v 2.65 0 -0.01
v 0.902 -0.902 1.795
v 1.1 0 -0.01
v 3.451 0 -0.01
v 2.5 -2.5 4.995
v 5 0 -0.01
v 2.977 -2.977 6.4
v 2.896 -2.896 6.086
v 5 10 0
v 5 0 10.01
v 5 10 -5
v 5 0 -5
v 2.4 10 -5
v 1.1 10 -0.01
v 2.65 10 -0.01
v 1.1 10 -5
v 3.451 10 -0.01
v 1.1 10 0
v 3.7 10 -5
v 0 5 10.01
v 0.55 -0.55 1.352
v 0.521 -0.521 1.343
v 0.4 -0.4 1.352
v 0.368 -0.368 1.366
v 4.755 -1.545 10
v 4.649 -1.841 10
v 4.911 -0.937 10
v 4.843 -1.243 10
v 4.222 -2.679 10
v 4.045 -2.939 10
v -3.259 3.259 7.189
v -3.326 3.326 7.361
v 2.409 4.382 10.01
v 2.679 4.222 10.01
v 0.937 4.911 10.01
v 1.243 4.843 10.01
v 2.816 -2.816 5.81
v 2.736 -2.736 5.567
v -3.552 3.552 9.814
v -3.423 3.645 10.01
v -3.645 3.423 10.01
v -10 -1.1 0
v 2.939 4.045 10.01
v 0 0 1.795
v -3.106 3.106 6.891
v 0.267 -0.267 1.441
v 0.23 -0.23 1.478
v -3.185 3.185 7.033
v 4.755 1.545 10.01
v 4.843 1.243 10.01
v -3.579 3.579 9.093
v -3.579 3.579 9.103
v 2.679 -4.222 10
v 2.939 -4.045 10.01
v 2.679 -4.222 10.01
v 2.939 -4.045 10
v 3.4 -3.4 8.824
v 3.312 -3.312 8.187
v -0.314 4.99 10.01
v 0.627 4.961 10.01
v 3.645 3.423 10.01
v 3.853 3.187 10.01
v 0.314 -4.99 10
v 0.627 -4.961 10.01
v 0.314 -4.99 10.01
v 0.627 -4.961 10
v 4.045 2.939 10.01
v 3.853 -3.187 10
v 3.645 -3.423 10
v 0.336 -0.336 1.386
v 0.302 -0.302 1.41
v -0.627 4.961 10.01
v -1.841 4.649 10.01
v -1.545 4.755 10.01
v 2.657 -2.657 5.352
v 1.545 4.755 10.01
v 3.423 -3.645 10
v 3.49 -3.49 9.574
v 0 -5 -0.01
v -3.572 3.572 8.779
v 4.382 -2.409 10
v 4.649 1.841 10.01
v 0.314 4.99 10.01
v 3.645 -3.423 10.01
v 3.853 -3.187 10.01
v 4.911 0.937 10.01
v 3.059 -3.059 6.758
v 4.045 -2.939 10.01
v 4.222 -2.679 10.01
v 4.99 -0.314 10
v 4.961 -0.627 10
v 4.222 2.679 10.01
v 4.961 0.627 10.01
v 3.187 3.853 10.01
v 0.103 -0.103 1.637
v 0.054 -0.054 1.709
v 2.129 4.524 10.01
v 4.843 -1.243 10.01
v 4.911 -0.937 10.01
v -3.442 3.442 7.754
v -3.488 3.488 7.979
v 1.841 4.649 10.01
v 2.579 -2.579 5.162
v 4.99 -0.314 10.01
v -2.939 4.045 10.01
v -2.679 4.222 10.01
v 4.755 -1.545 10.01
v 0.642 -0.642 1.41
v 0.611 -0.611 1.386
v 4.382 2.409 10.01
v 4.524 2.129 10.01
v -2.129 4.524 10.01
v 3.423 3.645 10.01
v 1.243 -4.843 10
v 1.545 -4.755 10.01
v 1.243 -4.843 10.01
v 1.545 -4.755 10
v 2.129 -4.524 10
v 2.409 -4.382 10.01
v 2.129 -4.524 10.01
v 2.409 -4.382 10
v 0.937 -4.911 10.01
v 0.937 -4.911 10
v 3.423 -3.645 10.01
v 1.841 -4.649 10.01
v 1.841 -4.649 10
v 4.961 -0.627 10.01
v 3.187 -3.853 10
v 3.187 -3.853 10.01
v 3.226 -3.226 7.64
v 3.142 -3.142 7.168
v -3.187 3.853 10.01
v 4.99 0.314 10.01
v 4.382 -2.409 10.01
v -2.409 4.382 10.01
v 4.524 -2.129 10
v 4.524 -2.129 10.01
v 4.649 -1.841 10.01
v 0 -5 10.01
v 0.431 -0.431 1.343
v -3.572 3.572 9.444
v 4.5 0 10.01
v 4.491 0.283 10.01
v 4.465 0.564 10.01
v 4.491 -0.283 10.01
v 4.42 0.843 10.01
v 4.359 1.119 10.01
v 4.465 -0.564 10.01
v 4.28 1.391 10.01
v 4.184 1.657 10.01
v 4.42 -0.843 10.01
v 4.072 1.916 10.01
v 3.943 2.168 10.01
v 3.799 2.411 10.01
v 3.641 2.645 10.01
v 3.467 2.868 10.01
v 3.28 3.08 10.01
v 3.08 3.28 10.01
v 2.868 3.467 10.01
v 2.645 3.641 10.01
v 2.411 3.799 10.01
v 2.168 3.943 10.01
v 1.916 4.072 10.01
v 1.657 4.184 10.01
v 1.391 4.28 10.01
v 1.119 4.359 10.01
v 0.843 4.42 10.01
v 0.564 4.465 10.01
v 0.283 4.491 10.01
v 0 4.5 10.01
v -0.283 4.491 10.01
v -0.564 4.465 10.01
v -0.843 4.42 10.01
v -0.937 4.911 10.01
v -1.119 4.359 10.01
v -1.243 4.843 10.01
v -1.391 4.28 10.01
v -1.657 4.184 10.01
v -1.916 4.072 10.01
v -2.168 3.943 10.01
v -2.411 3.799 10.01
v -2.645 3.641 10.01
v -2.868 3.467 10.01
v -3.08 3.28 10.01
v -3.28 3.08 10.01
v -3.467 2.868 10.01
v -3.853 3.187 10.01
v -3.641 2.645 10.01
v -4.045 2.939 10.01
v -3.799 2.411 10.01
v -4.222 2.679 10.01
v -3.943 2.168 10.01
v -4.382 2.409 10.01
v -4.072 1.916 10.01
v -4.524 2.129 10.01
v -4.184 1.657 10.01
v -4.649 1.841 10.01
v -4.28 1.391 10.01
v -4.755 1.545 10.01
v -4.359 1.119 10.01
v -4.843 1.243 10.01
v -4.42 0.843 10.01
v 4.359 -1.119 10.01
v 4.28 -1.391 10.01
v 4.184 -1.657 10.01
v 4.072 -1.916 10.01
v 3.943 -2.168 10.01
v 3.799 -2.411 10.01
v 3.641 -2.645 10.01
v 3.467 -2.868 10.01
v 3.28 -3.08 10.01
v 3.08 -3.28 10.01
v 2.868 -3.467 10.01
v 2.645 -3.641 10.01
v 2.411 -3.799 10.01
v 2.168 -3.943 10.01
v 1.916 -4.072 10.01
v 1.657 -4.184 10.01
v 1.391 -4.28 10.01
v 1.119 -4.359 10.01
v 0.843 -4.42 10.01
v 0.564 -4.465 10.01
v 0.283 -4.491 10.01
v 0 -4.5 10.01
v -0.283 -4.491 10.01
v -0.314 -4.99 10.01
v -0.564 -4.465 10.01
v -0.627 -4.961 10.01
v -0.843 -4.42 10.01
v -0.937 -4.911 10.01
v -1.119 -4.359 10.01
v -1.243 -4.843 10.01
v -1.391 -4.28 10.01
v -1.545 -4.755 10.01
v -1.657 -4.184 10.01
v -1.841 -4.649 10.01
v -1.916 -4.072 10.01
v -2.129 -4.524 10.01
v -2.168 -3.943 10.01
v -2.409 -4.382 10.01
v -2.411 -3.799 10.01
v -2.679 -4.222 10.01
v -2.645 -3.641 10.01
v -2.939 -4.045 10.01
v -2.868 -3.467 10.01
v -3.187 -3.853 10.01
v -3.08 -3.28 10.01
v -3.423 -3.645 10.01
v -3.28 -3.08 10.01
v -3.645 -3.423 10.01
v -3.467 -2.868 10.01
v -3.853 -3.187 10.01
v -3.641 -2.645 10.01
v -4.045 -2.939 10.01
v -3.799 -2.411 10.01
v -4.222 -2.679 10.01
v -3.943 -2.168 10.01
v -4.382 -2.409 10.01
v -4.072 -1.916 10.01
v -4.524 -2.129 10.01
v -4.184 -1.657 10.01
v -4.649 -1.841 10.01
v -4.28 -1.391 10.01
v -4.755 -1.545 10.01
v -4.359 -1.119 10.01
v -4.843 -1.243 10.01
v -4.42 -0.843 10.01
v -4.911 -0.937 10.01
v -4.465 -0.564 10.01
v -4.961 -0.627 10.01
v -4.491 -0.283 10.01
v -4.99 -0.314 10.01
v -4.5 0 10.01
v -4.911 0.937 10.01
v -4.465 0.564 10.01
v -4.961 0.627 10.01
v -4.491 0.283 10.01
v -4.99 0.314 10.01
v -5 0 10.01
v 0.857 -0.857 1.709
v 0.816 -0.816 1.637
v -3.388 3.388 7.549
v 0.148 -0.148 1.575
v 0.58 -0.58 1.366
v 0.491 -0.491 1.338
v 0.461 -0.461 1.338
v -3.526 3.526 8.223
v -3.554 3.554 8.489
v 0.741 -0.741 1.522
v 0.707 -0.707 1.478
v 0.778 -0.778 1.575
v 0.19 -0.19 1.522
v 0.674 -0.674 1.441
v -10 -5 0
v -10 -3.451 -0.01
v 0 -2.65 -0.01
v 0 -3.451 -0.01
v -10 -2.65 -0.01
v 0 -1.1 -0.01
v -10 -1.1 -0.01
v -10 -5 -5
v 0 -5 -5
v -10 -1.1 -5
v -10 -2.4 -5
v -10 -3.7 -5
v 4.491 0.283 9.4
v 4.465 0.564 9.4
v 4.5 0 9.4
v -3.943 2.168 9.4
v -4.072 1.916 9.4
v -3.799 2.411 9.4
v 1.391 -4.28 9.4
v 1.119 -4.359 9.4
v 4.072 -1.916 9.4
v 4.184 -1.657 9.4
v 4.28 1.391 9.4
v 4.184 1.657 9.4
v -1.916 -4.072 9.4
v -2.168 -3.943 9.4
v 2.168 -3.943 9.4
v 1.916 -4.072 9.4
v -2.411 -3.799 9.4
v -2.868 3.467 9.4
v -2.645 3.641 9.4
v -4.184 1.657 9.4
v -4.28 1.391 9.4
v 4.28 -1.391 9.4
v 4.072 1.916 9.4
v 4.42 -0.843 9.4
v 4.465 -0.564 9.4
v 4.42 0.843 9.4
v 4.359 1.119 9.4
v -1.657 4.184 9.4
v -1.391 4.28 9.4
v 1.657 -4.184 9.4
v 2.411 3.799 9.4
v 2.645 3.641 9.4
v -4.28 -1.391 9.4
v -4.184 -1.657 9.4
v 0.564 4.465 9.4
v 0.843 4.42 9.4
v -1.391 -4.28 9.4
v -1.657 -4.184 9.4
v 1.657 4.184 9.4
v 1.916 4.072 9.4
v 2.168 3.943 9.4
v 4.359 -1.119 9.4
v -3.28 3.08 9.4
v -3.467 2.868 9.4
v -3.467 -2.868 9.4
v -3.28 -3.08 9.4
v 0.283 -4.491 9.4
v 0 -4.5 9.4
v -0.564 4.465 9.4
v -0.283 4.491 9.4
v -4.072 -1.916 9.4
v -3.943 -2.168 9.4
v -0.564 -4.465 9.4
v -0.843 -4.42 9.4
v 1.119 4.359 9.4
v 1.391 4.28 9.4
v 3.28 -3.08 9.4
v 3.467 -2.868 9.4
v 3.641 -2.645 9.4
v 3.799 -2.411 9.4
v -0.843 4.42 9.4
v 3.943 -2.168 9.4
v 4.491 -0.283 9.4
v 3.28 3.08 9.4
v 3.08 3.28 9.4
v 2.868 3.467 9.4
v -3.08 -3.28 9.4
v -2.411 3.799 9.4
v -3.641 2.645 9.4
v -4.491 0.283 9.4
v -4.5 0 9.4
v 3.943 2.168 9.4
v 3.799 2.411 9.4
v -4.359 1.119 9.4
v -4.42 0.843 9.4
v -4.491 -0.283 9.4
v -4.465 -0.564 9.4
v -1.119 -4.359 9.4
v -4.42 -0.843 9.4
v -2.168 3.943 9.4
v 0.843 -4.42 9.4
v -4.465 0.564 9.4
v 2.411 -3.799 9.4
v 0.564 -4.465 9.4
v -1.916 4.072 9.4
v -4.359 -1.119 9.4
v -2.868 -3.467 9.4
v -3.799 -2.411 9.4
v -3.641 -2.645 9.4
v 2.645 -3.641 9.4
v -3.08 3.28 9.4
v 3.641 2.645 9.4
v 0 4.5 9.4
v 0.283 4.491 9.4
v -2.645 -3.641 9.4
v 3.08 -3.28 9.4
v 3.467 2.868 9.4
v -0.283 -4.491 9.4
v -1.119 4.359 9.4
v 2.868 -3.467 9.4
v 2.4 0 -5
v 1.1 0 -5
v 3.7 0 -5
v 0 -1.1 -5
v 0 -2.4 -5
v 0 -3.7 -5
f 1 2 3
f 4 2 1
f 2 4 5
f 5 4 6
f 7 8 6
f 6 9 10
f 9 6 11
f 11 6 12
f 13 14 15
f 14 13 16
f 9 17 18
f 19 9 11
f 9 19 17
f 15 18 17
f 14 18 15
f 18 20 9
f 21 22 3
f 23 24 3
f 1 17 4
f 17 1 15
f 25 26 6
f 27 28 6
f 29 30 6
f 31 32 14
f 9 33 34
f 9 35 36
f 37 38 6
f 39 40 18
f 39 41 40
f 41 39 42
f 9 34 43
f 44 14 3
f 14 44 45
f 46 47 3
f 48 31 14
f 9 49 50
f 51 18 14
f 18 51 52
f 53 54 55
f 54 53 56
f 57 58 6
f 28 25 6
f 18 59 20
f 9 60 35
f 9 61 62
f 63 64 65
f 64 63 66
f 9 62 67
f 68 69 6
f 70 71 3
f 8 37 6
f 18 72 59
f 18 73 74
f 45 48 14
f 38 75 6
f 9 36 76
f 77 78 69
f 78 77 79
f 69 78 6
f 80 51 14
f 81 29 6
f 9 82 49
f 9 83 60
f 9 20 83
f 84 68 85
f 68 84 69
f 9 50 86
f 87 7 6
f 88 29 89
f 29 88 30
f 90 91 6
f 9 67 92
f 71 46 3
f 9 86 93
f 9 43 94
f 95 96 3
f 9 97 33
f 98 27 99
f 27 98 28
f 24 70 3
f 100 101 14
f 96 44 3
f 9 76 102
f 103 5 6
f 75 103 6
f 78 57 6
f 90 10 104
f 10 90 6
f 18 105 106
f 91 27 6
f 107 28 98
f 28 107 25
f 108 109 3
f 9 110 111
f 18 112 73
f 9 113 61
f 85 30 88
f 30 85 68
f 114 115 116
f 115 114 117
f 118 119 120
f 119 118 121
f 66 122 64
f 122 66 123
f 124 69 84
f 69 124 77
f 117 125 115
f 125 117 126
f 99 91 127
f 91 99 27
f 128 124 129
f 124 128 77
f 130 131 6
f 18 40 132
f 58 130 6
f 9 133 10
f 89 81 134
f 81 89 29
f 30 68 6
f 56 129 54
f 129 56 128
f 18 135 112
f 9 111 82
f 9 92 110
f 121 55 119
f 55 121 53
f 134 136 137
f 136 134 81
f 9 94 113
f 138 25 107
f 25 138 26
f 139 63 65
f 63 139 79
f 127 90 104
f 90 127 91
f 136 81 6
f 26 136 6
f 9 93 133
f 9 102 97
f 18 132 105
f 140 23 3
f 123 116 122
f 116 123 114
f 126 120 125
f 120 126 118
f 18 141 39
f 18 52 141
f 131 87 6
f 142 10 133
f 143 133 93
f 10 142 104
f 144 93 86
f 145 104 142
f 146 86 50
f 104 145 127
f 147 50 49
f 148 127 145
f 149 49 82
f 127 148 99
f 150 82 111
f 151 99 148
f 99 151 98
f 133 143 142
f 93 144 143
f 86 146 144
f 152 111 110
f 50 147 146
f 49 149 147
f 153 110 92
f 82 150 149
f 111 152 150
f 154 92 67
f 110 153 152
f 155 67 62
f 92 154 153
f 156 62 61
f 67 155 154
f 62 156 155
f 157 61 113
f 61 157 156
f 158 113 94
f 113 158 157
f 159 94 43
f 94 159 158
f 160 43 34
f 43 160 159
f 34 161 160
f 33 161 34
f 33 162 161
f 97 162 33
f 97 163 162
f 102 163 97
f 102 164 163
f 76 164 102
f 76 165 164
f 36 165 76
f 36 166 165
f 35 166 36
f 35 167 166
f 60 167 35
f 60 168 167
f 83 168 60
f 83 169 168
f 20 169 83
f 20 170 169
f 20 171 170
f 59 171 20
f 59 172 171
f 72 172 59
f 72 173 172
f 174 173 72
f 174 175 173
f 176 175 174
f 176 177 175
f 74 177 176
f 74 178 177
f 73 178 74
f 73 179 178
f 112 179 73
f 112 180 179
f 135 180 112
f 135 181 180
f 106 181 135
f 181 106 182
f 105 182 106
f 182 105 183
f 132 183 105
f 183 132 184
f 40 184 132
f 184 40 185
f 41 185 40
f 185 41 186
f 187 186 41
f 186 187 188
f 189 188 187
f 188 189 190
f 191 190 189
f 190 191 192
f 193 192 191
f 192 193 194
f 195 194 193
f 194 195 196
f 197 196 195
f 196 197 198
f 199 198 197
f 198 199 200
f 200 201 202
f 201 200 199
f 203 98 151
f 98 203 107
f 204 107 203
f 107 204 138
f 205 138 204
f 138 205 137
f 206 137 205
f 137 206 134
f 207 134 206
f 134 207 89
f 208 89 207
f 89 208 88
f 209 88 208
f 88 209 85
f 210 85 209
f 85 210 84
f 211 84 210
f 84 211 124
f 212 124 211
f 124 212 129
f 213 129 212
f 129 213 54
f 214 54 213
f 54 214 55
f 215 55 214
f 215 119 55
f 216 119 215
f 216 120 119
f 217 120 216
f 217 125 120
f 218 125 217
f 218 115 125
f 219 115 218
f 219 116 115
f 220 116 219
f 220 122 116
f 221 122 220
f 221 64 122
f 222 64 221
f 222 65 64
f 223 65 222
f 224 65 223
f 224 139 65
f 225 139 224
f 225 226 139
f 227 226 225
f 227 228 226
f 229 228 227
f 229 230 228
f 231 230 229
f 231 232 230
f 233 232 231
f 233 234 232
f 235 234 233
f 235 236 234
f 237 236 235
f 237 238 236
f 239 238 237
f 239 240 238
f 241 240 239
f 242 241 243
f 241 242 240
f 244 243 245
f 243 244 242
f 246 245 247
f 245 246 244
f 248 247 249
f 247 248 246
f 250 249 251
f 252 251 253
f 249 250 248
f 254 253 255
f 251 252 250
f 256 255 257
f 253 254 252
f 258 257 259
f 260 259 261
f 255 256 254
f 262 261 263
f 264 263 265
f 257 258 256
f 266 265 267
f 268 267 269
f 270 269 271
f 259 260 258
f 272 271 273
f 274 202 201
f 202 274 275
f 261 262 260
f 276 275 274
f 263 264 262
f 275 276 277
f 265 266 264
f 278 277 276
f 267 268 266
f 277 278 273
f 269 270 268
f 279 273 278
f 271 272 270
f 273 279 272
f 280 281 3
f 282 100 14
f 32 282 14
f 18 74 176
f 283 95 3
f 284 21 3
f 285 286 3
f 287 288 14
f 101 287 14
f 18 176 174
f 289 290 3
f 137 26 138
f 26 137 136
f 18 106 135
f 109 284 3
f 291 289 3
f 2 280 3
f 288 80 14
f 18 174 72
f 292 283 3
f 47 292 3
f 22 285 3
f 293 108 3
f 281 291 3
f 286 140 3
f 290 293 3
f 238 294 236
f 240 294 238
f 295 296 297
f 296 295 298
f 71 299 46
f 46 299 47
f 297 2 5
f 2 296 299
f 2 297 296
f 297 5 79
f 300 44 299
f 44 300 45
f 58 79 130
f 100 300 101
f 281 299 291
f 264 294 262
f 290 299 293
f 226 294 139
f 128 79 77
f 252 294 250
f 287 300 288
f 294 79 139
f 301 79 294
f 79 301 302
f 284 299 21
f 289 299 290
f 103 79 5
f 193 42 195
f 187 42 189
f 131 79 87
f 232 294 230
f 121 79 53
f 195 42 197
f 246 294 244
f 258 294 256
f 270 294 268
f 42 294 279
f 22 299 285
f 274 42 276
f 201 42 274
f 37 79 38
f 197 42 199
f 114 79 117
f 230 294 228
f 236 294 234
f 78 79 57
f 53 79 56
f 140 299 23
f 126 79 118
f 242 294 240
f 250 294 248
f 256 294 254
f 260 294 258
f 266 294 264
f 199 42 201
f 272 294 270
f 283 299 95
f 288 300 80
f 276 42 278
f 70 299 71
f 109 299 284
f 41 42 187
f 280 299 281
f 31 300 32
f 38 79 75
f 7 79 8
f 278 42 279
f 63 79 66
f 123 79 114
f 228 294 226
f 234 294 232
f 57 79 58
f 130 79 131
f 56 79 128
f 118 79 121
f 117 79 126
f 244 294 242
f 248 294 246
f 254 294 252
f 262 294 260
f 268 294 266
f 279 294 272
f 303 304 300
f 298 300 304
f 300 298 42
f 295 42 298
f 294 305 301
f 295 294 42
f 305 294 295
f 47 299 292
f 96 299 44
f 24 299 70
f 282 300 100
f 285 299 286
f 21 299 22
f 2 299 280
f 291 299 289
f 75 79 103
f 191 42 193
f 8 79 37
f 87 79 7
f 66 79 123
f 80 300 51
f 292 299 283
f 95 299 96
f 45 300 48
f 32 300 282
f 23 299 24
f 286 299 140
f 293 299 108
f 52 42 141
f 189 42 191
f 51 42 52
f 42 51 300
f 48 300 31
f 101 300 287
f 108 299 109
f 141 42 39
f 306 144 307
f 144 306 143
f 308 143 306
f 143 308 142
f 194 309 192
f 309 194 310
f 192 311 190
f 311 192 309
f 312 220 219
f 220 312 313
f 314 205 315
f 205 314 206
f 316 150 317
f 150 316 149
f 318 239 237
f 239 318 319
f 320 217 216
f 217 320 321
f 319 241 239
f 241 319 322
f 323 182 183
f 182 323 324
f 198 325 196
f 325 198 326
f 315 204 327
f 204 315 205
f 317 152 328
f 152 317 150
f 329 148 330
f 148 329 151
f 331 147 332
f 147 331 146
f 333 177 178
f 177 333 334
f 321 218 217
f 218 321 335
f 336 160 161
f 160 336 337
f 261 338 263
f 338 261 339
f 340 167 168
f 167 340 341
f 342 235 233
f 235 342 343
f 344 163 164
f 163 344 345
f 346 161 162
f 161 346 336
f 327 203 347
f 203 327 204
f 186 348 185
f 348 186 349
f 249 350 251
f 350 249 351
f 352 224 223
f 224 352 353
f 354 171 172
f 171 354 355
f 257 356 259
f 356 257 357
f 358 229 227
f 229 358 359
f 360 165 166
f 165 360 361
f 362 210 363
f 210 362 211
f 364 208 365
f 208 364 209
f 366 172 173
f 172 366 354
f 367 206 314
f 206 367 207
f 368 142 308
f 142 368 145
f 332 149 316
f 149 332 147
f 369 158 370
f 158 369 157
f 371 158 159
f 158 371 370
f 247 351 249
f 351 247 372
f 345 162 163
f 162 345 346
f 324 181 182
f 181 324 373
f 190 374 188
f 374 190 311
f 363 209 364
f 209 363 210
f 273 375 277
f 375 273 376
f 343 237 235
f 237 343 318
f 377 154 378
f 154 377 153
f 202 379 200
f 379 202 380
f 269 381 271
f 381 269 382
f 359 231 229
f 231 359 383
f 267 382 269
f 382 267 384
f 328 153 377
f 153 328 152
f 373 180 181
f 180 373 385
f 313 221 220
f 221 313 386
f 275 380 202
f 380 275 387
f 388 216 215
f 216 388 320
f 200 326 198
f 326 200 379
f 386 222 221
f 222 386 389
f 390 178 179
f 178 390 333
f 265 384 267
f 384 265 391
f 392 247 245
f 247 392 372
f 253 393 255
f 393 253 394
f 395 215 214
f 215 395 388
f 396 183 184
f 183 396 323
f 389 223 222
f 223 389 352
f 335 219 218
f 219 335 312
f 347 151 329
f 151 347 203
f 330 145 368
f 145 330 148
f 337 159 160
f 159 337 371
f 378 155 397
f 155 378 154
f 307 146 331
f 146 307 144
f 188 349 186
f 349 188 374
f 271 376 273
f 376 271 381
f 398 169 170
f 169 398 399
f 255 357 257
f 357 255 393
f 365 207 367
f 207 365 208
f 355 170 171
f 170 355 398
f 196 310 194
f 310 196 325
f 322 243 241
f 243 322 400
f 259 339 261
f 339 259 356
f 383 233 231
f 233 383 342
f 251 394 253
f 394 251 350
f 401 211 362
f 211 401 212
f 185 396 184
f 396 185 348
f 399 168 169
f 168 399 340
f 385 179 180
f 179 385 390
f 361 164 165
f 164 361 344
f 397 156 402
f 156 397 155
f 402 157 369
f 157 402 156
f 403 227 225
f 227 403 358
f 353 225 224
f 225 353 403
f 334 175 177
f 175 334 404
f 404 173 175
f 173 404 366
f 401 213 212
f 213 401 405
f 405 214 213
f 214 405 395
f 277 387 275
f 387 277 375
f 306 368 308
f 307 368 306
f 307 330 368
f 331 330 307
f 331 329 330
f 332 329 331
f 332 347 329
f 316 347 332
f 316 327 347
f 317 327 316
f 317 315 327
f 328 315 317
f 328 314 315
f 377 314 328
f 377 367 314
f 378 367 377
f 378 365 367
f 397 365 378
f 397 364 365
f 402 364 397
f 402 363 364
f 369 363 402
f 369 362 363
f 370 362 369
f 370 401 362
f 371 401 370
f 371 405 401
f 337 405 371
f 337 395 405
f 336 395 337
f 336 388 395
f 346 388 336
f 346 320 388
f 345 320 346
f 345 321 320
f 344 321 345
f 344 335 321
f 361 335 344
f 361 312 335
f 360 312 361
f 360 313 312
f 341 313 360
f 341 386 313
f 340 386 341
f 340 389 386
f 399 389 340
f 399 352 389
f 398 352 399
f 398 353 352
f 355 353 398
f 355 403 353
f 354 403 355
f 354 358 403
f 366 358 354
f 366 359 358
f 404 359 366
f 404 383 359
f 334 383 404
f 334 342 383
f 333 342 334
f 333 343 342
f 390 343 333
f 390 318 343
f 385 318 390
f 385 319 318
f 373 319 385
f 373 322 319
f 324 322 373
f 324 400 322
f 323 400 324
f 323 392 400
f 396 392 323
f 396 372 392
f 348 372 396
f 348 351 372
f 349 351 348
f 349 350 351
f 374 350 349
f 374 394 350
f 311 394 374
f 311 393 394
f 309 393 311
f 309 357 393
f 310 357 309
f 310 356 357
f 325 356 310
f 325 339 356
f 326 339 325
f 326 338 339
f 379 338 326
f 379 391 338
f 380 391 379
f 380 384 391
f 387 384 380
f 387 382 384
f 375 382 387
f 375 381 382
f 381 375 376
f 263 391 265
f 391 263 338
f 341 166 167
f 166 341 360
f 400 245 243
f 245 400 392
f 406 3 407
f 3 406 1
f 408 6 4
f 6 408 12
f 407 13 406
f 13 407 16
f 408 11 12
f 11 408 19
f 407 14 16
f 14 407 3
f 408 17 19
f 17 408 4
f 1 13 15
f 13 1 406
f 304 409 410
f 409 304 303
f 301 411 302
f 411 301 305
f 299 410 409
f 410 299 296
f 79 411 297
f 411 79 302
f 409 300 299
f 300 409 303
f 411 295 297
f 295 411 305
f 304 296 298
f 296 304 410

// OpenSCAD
wall = 1;

ysize = 100;
lifty = 20;
angle = asin(lifty / ysize);

footd = 9;
foot_sep = 4;
foot_edge = 1;
foot_size = foot_edge + 2*(footd + foot_sep) + foot_edge;
foot_inset = 0.7;

wall_wide =  wall+0.3;
w = wall_wide + 2;
ww = 3*w;

//cube ([foot_size, foot_size, 1], center=true);
//tilter_foot(lifty, ww);
//tilter_foot(2);
/* translate ([foot_size + 2, 0, 0]) { */
/*     tilter(angle, wall-0.2, wall_wide, 5); */
/* } */
corner_tilter(20, 10, wall-0.2, wall_wide);

$fn=100;

module corner_tilter(size, height, wall_small, wall_wide) {
    foot_extra = 1;
    grabber_size = size/2;
    grabber_width = wall_wide * 3;
    grabber_height = 5;
    difference() {
        union() {
            hull() {
                translate ([0, 0, height]) {
                    cylinder (0.01, d=footd + foot_extra);
                }
                translate ([-size/4, size/4, 0]) {
                    rotate ([180, 0, 0]) {
                        translate ([size/2, 0, 0]) {
                            rotate ([0, 0, 90]) {
                                grabber_base(grabber_size);
                            }
                        }
                    }
                }
            }
            hull() {
                translate ([0, 0, height]) {
                    cylinder (0.01, d=footd + foot_extra);
                }
                translate ([-size/4, size/4, 0]) {
                    rotate ([180, 0, 0]) {
                        translate ([0, size/2, 0]) {
                            rotate ([0, 0, 180]) {
                                grabber_base(grabber_size);
                            }
                        }
                    }
                }
            }
        }
        translate ([0, 0, height-foot_inset+0.1]) {
            cylinder (foot_inset, d=footd);
        }
    }

    translate ([-size/4, size/4, 0]) {
        rotate ([180, 0, 0]) {
            translate ([size/2, 0, 0]) {
                rotate ([0, 0, 90]) {
                    grabber(grabber_size);
                }
            }
            translate ([0, size/2, 0]) {
                rotate ([0, 0, 180]) {
                    grabber(grabber_size);
                }
            }
        }
    }

    module grabber_base(size) {
        translate ([-size/2, 0, 0]) {
            cube ([size, grabber_width, 0.01]);
        }        
    }
    module grabber(size) {
        translate ([-size/2, 0, 0]) {
            difference() {
                cube ([size, grabber_width, grabber_height]);
                translate ([0, grabber_width/2 - wall_wide/2, 0]) {
                    hull() {
                        translate ([0, wall_wide/2 - wall_small/2, 0]) {
                            cube ([size, wall_small, 0.01]);
                        }
                        translate([0, 0, grabber_height]) {
                            cube ([size, wall_wide, 0.01]);
                        }
                    }
                }
            }
        }
    }
}








module tilter(angle, wall_small, wall_wide, height) {

    translate ([foot_size/2, foot_size/2, sin(angle) * ww/2]) {
        union() {
            hull() {
                rotate ([angle, 0, 0]) {
                    cube ([foot_size, ww, 0.01], center=true);
                }
                translate ([0, 0, -sin(angle) * ww/2]) {
                    cube ([foot_size, ww, 0.01], center=true);
                }
            }
    
            rotate ([angle, 0, 0]) {
                difference()
                {
                    hull() {
                        cube ([foot_size, ww, 0.01], center=true);
                        translate ([0, 0, height]) {
                            cube ([foot_size, w, 0.01], center=true);
                        }
                    }
                    hull() {
                        cube([foot_size, wall_small, 0.01], center=true);
                        translate ([0, 0, height]) {
                            cube([foot_size, wall_wide, 0.01], center=true);
                        }
                    }
                }
            }
        }
    }
}

module tilter_foot(h, ww) {
    foot_inset = 1;
    translate ([foot_size/2, foot_size/2, 0]) {
        hull() {
            cube ([foot_size, ww, 0.01], center=true);
            translate ([0, 0, h]) {
                cube ([foot_size, foot_size, 0.01], center=true);
            }
        }
    }
    translate([0, 0, h]) {
        difference() {
            cube ([foot_size, foot_size, 2]);
            translate ([0, 0, 2-foot_inset]) {
                foot_center1 = foot_edge + footd/2;
                foot_center2 = foot_size - foot_center1;
                translate([foot_center1, foot_center1, 0]) {
                    cylinder (foot_inset, footd/2, footd/2);
                }
                translate([foot_center2, foot_center1, 0]) {
                    cylinder (foot_inset, footd/2, footd/2);
                }
                translate([foot_center1, foot_center2, 0]) {
                    cylinder (foot_inset, footd/2, footd/2);
                }
                translate([foot_center2, foot_center2, 0]) {
                    cylinder (foot_inset, footd/2, footd/2);
                }
            }
        }
    }
}
